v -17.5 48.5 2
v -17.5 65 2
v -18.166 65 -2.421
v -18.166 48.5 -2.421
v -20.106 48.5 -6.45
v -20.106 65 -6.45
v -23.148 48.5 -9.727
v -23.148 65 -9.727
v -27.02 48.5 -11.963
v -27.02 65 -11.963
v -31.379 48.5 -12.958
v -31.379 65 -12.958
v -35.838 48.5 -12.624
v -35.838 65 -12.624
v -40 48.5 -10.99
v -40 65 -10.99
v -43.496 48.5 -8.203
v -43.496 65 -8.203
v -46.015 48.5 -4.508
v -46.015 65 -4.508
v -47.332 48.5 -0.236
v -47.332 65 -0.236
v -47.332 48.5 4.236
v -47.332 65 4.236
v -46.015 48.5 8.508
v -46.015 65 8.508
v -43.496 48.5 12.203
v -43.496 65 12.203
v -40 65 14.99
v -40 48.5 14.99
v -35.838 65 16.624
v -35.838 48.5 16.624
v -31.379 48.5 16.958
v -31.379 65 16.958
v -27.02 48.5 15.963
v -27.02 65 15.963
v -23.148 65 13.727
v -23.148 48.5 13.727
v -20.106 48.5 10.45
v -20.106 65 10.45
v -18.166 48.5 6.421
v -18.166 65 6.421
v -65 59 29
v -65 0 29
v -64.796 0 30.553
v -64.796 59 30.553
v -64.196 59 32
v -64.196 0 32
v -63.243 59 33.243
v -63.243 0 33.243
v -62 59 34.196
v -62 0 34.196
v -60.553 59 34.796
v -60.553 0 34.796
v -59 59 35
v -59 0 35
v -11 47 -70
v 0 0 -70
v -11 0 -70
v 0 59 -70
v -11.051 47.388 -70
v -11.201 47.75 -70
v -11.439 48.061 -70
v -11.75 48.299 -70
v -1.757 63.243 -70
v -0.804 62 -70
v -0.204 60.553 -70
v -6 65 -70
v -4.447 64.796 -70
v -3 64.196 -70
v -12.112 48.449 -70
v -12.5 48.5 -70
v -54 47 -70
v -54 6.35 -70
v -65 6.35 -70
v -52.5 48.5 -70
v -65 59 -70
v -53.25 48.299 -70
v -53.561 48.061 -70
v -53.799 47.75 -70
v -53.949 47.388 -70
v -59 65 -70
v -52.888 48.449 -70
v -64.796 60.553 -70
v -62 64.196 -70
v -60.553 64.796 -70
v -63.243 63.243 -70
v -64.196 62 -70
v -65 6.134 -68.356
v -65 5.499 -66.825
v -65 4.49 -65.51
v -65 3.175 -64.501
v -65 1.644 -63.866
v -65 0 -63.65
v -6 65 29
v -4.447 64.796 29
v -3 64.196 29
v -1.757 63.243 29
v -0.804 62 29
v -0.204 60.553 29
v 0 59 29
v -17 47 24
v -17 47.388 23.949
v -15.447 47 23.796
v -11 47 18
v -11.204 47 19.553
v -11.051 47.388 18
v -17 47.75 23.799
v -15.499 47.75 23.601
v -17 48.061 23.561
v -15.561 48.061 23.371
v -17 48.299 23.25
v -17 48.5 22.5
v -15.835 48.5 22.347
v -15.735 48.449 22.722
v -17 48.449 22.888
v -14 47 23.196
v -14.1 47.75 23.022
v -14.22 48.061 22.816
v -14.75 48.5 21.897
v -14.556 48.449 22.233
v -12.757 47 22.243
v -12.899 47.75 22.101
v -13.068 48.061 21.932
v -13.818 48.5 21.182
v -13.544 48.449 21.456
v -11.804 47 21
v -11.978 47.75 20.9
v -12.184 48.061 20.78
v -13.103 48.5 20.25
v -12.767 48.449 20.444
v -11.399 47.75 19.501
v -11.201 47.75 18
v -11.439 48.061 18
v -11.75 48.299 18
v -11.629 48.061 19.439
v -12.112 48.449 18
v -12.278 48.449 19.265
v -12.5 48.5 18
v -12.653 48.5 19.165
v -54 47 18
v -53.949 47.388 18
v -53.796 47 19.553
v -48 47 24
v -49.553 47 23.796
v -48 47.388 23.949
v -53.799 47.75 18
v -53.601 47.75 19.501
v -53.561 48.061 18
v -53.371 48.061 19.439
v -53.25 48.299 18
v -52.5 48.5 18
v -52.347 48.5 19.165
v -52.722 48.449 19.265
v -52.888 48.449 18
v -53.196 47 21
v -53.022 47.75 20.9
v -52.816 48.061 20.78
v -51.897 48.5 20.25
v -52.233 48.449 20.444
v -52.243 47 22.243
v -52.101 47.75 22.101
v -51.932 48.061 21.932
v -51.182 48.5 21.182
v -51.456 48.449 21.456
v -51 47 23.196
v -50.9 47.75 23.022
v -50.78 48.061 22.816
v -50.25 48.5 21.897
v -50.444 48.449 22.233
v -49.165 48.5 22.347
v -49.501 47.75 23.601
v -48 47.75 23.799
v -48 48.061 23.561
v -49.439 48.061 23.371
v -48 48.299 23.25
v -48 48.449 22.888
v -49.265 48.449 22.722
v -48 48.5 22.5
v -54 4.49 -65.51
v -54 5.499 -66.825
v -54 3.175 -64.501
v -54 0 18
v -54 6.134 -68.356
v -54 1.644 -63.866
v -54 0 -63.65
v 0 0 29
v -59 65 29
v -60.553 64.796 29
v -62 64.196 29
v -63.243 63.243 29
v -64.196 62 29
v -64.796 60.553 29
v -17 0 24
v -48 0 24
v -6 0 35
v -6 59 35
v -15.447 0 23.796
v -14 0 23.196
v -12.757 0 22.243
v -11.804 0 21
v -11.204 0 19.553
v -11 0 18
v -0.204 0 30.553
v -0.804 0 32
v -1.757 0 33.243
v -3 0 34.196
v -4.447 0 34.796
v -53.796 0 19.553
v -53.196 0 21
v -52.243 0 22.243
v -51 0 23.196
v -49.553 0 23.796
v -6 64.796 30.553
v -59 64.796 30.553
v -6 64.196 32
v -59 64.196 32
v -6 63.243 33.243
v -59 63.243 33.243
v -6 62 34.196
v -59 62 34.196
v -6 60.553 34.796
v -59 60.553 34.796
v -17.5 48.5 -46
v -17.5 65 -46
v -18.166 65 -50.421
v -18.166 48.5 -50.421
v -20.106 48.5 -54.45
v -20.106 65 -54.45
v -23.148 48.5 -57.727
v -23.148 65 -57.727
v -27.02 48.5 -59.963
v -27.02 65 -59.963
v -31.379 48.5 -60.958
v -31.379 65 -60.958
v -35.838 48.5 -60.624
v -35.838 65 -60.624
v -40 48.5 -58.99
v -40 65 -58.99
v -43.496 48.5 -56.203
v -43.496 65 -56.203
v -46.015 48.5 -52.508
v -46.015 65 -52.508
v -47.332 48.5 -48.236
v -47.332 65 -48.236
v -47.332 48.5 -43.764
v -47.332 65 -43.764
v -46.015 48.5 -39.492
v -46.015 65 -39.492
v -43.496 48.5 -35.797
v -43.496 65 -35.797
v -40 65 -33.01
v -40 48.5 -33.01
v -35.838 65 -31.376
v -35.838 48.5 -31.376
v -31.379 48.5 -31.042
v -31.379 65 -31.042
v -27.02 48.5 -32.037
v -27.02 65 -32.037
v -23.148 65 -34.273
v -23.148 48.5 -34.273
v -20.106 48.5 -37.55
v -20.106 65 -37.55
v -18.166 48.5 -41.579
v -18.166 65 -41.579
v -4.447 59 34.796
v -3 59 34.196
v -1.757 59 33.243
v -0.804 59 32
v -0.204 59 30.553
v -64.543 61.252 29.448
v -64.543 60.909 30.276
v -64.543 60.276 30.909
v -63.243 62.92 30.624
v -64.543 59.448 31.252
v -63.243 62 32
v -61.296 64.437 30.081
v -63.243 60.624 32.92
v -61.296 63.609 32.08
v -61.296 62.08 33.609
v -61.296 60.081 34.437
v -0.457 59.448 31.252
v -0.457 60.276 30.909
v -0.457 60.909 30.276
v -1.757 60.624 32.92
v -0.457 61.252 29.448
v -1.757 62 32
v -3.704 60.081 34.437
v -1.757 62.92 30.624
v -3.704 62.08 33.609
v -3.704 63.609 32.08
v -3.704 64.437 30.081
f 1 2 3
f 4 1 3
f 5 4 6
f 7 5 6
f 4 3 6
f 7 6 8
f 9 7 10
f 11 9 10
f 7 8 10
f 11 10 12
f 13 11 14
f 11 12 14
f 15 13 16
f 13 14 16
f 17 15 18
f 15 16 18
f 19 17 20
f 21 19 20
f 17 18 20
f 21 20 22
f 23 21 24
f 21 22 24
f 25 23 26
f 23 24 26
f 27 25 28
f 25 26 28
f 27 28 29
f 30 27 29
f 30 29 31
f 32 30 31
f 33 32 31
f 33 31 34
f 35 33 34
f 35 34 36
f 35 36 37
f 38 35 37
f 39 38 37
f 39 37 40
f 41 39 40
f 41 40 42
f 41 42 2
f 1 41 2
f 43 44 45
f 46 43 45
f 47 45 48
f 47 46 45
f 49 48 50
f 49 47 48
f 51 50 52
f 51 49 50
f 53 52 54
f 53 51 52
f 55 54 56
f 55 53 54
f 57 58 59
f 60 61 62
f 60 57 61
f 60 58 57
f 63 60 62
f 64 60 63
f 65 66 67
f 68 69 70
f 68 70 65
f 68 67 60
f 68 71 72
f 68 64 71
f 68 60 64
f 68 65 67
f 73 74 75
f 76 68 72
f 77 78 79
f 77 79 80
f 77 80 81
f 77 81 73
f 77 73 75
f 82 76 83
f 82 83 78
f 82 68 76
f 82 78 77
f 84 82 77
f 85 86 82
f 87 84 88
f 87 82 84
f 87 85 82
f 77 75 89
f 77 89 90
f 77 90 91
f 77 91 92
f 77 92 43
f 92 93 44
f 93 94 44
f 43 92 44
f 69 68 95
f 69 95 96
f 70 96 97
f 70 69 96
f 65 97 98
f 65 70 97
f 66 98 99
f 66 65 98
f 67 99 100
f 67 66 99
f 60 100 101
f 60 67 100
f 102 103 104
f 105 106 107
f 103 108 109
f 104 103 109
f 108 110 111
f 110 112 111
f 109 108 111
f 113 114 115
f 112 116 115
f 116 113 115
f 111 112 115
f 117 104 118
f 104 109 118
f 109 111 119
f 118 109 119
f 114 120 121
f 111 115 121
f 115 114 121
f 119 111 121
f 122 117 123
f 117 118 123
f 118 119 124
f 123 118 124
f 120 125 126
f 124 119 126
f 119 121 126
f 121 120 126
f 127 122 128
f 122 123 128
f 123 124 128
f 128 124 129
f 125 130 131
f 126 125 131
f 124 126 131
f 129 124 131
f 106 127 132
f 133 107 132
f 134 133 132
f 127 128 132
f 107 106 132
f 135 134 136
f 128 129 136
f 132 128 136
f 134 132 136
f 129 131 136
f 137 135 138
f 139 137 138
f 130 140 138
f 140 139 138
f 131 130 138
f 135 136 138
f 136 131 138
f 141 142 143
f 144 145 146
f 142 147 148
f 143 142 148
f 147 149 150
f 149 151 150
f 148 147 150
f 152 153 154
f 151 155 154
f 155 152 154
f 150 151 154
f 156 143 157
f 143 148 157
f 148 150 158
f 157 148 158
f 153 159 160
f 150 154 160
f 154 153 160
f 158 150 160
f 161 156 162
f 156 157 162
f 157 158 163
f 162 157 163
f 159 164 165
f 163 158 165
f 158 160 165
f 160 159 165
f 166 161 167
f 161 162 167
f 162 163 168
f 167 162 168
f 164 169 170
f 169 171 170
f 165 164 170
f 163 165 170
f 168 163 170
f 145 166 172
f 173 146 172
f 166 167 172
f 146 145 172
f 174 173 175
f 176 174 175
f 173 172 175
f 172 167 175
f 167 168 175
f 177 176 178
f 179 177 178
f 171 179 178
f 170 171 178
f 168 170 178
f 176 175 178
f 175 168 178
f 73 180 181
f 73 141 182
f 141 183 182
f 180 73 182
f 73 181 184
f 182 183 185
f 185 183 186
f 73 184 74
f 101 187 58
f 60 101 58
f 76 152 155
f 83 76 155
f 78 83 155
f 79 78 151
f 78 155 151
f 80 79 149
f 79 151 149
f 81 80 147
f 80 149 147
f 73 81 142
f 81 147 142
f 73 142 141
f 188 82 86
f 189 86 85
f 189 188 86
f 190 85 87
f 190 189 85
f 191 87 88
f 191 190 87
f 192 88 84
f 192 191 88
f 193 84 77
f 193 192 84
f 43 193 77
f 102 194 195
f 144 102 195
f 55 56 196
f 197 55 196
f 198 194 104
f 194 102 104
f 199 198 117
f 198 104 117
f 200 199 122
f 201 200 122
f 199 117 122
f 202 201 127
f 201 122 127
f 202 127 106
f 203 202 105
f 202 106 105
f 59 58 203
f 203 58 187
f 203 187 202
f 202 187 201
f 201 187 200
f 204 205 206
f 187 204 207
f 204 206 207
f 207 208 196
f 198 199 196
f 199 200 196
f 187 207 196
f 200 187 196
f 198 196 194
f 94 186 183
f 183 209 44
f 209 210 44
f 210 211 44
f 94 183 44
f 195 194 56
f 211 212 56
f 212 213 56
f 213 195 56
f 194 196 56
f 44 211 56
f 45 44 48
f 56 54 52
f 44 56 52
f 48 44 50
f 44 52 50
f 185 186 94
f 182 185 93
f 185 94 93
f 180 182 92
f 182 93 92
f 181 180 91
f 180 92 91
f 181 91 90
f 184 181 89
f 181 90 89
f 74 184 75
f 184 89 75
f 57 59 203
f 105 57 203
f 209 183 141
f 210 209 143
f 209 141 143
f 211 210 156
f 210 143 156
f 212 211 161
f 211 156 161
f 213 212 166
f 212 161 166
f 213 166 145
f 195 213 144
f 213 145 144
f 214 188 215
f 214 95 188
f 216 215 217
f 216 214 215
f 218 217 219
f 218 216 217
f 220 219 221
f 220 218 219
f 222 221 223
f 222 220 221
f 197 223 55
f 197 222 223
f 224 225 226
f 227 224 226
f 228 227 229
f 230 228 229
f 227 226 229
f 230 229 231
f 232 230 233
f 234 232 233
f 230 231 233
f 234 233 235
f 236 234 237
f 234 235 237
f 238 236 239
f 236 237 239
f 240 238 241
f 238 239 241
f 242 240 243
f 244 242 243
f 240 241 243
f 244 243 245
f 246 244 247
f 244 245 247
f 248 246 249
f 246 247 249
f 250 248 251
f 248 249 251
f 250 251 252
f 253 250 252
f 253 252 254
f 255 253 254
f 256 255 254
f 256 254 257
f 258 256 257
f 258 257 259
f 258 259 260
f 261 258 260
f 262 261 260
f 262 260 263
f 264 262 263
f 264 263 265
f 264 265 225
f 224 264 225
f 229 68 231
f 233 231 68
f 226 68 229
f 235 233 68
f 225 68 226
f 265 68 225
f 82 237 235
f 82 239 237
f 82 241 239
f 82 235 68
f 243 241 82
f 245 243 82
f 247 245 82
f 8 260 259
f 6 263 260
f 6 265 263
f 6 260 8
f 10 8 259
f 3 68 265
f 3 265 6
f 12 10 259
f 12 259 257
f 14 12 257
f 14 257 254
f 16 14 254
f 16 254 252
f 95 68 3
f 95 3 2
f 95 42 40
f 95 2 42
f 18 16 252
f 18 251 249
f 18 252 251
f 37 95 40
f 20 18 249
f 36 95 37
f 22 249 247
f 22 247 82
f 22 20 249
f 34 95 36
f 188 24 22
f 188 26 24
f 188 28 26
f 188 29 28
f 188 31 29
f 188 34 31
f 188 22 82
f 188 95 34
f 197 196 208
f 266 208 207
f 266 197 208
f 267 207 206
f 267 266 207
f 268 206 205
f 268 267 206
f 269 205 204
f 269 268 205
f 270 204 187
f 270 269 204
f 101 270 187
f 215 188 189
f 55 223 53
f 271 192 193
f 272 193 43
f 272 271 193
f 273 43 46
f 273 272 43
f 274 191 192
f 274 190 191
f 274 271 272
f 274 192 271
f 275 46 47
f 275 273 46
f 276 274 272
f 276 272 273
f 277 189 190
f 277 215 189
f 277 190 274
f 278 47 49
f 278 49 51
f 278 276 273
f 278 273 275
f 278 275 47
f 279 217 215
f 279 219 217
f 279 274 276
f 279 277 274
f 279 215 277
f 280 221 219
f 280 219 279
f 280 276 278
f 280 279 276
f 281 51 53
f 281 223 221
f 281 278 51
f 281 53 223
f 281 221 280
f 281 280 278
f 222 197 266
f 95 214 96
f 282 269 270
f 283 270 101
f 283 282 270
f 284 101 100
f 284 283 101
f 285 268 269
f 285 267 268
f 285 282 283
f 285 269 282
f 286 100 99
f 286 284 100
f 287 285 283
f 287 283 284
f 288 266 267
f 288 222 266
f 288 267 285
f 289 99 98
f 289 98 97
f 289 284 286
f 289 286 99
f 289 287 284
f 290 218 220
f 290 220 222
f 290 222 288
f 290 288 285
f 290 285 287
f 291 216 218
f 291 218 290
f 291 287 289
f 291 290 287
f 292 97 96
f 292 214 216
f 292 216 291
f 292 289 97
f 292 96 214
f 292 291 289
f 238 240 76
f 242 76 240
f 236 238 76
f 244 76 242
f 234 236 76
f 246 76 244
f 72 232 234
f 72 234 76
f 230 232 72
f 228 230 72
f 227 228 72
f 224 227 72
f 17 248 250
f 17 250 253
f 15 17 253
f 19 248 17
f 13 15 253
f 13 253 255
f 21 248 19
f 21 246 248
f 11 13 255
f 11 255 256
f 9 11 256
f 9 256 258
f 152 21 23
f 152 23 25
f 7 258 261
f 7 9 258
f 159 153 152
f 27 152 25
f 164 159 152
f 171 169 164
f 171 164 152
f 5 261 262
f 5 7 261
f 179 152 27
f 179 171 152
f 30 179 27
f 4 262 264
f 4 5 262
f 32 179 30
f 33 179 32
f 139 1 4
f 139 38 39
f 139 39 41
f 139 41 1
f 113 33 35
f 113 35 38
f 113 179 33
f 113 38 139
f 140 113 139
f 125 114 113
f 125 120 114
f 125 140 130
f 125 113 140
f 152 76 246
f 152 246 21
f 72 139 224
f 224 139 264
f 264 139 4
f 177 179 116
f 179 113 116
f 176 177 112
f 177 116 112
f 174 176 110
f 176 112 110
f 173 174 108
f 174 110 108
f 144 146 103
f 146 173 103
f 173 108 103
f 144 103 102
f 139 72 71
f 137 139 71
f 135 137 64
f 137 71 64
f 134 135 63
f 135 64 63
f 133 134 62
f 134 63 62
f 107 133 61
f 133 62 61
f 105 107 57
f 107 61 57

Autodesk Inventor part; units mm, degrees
ref_plane "YZ Plane" through (0, 0, 0) normal (1, 0, 0) x (0, 1, 0)
ref_plane "XZ Plane" through (0, 0, 0) normal (0, 1, 0) x (-1, 0, 0)
ref_plane "XY Plane" through (0, 0, 0) normal (0, 0, 1) x (1, 0, 0)
sketch "Base" plane through (0, 0, 0) normal (0, 1, 0) x (-1, 0, 0)
  line L0 (0, 35) -> (0, -175)
  line L1 (0, -175) -> (65, -175)
  line L2 (65, -175) -> (65, 35)
  line L3 (65, 35) -> (0, 35)
  dimension "d6" = 210
  dimension "d7" = 65
extrude "Extrusion2" add sketch "Base" along normal blind 65
sketch "Top" plane through (0, 65, 0) normal (0, 1, 0) x (1, 0, 0)
  circle A0 centre (-32.5, 46) radius 17
  circle A1 centre (-32.5, -2) radius 17
  circle A2 centre (-32.5, 94) radius 17
  circle A3 centre (-32.5, 142) radius 17
  line L0 (0, 175) -> (-65, 175) projected
  line L1 (-65, 175) -> (-65, -35) projected
  line L2 (-65, -35) -> (0, -35) construction
  line L3 (-32.5, -35) -> (-32.5, 175) construction
  circle A4 centre (-32.5, -2) radius 15
  circle A5 centre (-32.5, 46) radius 15
  circle A6 centre (-32.5, 94) radius 15
  circle A7 centre (-32.5, 142) radius 15
  point P0 (-32.5, 70)
  dimension "d10" = 34
  dimension "d11" = 34
  dimension "d12" = 34
  dimension "d13" = 34
  dimension "d14" = 48
  dimension "d15" = 48
  dimension "d16" = 48
  dimension "d27" = 30
  dimension "d28" = 30
  dimension "d29" = 30
  dimension "d30" = 30
  dimension "d31" = 24
  dimension "d32" = 105
  dimension "d35" = 33
extrude "Extrusion3" cut sketch "Top" against normal up to next contours A4 | A5 | A6 | A7
sketch "Walls" plane through (0, 0, 0) normal (0, -1, 0) x (1, 0, 0)
  line L0 (-11, 24) -> (-54, 24)
  line L1 (-54, 24) -> (-54, -164)
  line L2 (-54, -164) -> (-11, -164)
  line L3 (-11, -164) -> (-11, 24)
  line L4 (-65, 35) -> (0, 35) projected
  line L5 (0, -175) -> (-65, -175) projected
  line L6 (0, 35) -> (0, -175) projected
  line L7 (-65, -175) -> (-65, 35) projected
  point P0 (0, 0)
  dimension "d21" = 11
  dimension "d22" = 11
  dimension "d23" = 11
  dimension "d24" = 11
  dimension "d33" = 43
  dimension "d47" = 65
extrude "Extrusion4" cut sketch "Walls" against normal blind 48.5 contours L3 L2 L1 L0
sketch "Sketch6" plane through (0, 0, 35) normal (1, 0, 0) x (0, 0, -1)
  line L0 (0, 0) -> (210, 0) projected
  line L1 (11, 48.5) -> (199, 48.5) projected
  point P0 (35, 0)
  point P1 (33.3852, 33.5)
  dimension "d34" = 48.5
fillet "Fillet1" radius 6 8 edges at (-32.5, 65, 35) (-65, 65, -70) (0, 65, -70) (0, 32.5, 35) (-65, 32.5, 35) (0, 32.5, -175) (-32.5, 65, -175) (-65, 32.5, -175)
sketch "Sketch7" plane through (-65, 0, -169) normal (-1, 0, 0) x (0, 0, 1)
  line L0 (0, 59) -> (198, 59) projected
  line L1 (99, 59) -> (99, 0) construction
  line L2 (0, 0) -> (198, 0) projected
  circle A0 centre (99, 0) radius 6.35
  point P0 (169, 0)
  dimension "d40" = 12.7
extrude "Extrusion5" cut sketch "Sketch7" against normal up to surface (11 mm away)
fillet "Fillet2" radius 6 4 edges at (-11, 24.25, 24) (-54, 24.25, 24) (-11, 24.25, -164) (-54, 24.25, -164)
sketch "Sketch8" plane through (0, 0, 29) normal (1, 0, 0) x (0, 0, -1)
  line L0 (0, 0) -> (198, 0) projected
  line L1 (198, 65) -> (0, 65) projected
  point P0 (29, 0)
  dimension "d42" = 65
fillet "Fillet3" radius 1.5 8 edges at (-52.2426, 48.5, 22.2426) (-32.5, 48.5, 24) (-12.7574, 48.5, 22.2426) (-11, 48.5, -70) (-12.7574, 48.5, -162.2426) (-32.5, 48.5, -164) (-52.2426, 48.5, -162.2426) (-54, 48.5, -70)
sketch "Sketch9" plane through (0, 0, 0) normal (0, -1, 0) x (1, 0, 0)
  line L0 (-54, -63.65) -> (-54, 18) projected
  line L1 (-11, 18) -> (-11, -158) projected
  line L2 (-65, -63.65) -> (-54, -63.65) projected
  line L3 (-54, -76.35) -> (-65, -76.35) projected
  line L4 (-48, 24) -> (-17, 24) projected
  point P0 (0, 0)
  dimension "d44" = 43
  dimension "d45" = 12.7
  dimension "d46" = 87.65
sketch "Sketch11" plane through (-6, 0, -175) normal (0, 0, -1) x (-1, 0, 0)
  line L0 (84.0226, 97.8745) -> (-43.2429, 97.8745)
  line L1 (-43.2429, 97.8745) -> (-43.2429, -59.4459)
  line L2 (-43.2429, -59.4459) -> (84.0226, -59.4459)
  line L3 (84.0226, -59.4459) -> (84.0226, 97.8745)
  point P0 (-6, 0)
extrude "Extrusion7" cut sketch "Sketch11" against normal blind 105
equation "\"d8\" = d7"
equation "\"d11\" = d10"
equation "\"d12\" = d10"
equation "\"d13\" = d10"
equation "\"d15\" = d14"
equation "\"d16\" = d14"
equation "\"d28\" = d27"
equation "\"d29\" = d27"
equation "\"d30\" = d27"
equation "\"d31\" = 0.5 * d14"
equation "\"d32\" = 0.5 * d6"
equation "\"d22\" = d21"
equation "\"d23\" = d21"
equation "\"d24\" = d23"
equation "\"d25\" = d7 - 1.5 * d21"
equation "\"d41\" = d36"
equation "\"d43\" = 0.25 * d36"
equation "\"d50\" = 0.5 * d6"
equation "\"d36\" = 6"
properties part number "Full"
